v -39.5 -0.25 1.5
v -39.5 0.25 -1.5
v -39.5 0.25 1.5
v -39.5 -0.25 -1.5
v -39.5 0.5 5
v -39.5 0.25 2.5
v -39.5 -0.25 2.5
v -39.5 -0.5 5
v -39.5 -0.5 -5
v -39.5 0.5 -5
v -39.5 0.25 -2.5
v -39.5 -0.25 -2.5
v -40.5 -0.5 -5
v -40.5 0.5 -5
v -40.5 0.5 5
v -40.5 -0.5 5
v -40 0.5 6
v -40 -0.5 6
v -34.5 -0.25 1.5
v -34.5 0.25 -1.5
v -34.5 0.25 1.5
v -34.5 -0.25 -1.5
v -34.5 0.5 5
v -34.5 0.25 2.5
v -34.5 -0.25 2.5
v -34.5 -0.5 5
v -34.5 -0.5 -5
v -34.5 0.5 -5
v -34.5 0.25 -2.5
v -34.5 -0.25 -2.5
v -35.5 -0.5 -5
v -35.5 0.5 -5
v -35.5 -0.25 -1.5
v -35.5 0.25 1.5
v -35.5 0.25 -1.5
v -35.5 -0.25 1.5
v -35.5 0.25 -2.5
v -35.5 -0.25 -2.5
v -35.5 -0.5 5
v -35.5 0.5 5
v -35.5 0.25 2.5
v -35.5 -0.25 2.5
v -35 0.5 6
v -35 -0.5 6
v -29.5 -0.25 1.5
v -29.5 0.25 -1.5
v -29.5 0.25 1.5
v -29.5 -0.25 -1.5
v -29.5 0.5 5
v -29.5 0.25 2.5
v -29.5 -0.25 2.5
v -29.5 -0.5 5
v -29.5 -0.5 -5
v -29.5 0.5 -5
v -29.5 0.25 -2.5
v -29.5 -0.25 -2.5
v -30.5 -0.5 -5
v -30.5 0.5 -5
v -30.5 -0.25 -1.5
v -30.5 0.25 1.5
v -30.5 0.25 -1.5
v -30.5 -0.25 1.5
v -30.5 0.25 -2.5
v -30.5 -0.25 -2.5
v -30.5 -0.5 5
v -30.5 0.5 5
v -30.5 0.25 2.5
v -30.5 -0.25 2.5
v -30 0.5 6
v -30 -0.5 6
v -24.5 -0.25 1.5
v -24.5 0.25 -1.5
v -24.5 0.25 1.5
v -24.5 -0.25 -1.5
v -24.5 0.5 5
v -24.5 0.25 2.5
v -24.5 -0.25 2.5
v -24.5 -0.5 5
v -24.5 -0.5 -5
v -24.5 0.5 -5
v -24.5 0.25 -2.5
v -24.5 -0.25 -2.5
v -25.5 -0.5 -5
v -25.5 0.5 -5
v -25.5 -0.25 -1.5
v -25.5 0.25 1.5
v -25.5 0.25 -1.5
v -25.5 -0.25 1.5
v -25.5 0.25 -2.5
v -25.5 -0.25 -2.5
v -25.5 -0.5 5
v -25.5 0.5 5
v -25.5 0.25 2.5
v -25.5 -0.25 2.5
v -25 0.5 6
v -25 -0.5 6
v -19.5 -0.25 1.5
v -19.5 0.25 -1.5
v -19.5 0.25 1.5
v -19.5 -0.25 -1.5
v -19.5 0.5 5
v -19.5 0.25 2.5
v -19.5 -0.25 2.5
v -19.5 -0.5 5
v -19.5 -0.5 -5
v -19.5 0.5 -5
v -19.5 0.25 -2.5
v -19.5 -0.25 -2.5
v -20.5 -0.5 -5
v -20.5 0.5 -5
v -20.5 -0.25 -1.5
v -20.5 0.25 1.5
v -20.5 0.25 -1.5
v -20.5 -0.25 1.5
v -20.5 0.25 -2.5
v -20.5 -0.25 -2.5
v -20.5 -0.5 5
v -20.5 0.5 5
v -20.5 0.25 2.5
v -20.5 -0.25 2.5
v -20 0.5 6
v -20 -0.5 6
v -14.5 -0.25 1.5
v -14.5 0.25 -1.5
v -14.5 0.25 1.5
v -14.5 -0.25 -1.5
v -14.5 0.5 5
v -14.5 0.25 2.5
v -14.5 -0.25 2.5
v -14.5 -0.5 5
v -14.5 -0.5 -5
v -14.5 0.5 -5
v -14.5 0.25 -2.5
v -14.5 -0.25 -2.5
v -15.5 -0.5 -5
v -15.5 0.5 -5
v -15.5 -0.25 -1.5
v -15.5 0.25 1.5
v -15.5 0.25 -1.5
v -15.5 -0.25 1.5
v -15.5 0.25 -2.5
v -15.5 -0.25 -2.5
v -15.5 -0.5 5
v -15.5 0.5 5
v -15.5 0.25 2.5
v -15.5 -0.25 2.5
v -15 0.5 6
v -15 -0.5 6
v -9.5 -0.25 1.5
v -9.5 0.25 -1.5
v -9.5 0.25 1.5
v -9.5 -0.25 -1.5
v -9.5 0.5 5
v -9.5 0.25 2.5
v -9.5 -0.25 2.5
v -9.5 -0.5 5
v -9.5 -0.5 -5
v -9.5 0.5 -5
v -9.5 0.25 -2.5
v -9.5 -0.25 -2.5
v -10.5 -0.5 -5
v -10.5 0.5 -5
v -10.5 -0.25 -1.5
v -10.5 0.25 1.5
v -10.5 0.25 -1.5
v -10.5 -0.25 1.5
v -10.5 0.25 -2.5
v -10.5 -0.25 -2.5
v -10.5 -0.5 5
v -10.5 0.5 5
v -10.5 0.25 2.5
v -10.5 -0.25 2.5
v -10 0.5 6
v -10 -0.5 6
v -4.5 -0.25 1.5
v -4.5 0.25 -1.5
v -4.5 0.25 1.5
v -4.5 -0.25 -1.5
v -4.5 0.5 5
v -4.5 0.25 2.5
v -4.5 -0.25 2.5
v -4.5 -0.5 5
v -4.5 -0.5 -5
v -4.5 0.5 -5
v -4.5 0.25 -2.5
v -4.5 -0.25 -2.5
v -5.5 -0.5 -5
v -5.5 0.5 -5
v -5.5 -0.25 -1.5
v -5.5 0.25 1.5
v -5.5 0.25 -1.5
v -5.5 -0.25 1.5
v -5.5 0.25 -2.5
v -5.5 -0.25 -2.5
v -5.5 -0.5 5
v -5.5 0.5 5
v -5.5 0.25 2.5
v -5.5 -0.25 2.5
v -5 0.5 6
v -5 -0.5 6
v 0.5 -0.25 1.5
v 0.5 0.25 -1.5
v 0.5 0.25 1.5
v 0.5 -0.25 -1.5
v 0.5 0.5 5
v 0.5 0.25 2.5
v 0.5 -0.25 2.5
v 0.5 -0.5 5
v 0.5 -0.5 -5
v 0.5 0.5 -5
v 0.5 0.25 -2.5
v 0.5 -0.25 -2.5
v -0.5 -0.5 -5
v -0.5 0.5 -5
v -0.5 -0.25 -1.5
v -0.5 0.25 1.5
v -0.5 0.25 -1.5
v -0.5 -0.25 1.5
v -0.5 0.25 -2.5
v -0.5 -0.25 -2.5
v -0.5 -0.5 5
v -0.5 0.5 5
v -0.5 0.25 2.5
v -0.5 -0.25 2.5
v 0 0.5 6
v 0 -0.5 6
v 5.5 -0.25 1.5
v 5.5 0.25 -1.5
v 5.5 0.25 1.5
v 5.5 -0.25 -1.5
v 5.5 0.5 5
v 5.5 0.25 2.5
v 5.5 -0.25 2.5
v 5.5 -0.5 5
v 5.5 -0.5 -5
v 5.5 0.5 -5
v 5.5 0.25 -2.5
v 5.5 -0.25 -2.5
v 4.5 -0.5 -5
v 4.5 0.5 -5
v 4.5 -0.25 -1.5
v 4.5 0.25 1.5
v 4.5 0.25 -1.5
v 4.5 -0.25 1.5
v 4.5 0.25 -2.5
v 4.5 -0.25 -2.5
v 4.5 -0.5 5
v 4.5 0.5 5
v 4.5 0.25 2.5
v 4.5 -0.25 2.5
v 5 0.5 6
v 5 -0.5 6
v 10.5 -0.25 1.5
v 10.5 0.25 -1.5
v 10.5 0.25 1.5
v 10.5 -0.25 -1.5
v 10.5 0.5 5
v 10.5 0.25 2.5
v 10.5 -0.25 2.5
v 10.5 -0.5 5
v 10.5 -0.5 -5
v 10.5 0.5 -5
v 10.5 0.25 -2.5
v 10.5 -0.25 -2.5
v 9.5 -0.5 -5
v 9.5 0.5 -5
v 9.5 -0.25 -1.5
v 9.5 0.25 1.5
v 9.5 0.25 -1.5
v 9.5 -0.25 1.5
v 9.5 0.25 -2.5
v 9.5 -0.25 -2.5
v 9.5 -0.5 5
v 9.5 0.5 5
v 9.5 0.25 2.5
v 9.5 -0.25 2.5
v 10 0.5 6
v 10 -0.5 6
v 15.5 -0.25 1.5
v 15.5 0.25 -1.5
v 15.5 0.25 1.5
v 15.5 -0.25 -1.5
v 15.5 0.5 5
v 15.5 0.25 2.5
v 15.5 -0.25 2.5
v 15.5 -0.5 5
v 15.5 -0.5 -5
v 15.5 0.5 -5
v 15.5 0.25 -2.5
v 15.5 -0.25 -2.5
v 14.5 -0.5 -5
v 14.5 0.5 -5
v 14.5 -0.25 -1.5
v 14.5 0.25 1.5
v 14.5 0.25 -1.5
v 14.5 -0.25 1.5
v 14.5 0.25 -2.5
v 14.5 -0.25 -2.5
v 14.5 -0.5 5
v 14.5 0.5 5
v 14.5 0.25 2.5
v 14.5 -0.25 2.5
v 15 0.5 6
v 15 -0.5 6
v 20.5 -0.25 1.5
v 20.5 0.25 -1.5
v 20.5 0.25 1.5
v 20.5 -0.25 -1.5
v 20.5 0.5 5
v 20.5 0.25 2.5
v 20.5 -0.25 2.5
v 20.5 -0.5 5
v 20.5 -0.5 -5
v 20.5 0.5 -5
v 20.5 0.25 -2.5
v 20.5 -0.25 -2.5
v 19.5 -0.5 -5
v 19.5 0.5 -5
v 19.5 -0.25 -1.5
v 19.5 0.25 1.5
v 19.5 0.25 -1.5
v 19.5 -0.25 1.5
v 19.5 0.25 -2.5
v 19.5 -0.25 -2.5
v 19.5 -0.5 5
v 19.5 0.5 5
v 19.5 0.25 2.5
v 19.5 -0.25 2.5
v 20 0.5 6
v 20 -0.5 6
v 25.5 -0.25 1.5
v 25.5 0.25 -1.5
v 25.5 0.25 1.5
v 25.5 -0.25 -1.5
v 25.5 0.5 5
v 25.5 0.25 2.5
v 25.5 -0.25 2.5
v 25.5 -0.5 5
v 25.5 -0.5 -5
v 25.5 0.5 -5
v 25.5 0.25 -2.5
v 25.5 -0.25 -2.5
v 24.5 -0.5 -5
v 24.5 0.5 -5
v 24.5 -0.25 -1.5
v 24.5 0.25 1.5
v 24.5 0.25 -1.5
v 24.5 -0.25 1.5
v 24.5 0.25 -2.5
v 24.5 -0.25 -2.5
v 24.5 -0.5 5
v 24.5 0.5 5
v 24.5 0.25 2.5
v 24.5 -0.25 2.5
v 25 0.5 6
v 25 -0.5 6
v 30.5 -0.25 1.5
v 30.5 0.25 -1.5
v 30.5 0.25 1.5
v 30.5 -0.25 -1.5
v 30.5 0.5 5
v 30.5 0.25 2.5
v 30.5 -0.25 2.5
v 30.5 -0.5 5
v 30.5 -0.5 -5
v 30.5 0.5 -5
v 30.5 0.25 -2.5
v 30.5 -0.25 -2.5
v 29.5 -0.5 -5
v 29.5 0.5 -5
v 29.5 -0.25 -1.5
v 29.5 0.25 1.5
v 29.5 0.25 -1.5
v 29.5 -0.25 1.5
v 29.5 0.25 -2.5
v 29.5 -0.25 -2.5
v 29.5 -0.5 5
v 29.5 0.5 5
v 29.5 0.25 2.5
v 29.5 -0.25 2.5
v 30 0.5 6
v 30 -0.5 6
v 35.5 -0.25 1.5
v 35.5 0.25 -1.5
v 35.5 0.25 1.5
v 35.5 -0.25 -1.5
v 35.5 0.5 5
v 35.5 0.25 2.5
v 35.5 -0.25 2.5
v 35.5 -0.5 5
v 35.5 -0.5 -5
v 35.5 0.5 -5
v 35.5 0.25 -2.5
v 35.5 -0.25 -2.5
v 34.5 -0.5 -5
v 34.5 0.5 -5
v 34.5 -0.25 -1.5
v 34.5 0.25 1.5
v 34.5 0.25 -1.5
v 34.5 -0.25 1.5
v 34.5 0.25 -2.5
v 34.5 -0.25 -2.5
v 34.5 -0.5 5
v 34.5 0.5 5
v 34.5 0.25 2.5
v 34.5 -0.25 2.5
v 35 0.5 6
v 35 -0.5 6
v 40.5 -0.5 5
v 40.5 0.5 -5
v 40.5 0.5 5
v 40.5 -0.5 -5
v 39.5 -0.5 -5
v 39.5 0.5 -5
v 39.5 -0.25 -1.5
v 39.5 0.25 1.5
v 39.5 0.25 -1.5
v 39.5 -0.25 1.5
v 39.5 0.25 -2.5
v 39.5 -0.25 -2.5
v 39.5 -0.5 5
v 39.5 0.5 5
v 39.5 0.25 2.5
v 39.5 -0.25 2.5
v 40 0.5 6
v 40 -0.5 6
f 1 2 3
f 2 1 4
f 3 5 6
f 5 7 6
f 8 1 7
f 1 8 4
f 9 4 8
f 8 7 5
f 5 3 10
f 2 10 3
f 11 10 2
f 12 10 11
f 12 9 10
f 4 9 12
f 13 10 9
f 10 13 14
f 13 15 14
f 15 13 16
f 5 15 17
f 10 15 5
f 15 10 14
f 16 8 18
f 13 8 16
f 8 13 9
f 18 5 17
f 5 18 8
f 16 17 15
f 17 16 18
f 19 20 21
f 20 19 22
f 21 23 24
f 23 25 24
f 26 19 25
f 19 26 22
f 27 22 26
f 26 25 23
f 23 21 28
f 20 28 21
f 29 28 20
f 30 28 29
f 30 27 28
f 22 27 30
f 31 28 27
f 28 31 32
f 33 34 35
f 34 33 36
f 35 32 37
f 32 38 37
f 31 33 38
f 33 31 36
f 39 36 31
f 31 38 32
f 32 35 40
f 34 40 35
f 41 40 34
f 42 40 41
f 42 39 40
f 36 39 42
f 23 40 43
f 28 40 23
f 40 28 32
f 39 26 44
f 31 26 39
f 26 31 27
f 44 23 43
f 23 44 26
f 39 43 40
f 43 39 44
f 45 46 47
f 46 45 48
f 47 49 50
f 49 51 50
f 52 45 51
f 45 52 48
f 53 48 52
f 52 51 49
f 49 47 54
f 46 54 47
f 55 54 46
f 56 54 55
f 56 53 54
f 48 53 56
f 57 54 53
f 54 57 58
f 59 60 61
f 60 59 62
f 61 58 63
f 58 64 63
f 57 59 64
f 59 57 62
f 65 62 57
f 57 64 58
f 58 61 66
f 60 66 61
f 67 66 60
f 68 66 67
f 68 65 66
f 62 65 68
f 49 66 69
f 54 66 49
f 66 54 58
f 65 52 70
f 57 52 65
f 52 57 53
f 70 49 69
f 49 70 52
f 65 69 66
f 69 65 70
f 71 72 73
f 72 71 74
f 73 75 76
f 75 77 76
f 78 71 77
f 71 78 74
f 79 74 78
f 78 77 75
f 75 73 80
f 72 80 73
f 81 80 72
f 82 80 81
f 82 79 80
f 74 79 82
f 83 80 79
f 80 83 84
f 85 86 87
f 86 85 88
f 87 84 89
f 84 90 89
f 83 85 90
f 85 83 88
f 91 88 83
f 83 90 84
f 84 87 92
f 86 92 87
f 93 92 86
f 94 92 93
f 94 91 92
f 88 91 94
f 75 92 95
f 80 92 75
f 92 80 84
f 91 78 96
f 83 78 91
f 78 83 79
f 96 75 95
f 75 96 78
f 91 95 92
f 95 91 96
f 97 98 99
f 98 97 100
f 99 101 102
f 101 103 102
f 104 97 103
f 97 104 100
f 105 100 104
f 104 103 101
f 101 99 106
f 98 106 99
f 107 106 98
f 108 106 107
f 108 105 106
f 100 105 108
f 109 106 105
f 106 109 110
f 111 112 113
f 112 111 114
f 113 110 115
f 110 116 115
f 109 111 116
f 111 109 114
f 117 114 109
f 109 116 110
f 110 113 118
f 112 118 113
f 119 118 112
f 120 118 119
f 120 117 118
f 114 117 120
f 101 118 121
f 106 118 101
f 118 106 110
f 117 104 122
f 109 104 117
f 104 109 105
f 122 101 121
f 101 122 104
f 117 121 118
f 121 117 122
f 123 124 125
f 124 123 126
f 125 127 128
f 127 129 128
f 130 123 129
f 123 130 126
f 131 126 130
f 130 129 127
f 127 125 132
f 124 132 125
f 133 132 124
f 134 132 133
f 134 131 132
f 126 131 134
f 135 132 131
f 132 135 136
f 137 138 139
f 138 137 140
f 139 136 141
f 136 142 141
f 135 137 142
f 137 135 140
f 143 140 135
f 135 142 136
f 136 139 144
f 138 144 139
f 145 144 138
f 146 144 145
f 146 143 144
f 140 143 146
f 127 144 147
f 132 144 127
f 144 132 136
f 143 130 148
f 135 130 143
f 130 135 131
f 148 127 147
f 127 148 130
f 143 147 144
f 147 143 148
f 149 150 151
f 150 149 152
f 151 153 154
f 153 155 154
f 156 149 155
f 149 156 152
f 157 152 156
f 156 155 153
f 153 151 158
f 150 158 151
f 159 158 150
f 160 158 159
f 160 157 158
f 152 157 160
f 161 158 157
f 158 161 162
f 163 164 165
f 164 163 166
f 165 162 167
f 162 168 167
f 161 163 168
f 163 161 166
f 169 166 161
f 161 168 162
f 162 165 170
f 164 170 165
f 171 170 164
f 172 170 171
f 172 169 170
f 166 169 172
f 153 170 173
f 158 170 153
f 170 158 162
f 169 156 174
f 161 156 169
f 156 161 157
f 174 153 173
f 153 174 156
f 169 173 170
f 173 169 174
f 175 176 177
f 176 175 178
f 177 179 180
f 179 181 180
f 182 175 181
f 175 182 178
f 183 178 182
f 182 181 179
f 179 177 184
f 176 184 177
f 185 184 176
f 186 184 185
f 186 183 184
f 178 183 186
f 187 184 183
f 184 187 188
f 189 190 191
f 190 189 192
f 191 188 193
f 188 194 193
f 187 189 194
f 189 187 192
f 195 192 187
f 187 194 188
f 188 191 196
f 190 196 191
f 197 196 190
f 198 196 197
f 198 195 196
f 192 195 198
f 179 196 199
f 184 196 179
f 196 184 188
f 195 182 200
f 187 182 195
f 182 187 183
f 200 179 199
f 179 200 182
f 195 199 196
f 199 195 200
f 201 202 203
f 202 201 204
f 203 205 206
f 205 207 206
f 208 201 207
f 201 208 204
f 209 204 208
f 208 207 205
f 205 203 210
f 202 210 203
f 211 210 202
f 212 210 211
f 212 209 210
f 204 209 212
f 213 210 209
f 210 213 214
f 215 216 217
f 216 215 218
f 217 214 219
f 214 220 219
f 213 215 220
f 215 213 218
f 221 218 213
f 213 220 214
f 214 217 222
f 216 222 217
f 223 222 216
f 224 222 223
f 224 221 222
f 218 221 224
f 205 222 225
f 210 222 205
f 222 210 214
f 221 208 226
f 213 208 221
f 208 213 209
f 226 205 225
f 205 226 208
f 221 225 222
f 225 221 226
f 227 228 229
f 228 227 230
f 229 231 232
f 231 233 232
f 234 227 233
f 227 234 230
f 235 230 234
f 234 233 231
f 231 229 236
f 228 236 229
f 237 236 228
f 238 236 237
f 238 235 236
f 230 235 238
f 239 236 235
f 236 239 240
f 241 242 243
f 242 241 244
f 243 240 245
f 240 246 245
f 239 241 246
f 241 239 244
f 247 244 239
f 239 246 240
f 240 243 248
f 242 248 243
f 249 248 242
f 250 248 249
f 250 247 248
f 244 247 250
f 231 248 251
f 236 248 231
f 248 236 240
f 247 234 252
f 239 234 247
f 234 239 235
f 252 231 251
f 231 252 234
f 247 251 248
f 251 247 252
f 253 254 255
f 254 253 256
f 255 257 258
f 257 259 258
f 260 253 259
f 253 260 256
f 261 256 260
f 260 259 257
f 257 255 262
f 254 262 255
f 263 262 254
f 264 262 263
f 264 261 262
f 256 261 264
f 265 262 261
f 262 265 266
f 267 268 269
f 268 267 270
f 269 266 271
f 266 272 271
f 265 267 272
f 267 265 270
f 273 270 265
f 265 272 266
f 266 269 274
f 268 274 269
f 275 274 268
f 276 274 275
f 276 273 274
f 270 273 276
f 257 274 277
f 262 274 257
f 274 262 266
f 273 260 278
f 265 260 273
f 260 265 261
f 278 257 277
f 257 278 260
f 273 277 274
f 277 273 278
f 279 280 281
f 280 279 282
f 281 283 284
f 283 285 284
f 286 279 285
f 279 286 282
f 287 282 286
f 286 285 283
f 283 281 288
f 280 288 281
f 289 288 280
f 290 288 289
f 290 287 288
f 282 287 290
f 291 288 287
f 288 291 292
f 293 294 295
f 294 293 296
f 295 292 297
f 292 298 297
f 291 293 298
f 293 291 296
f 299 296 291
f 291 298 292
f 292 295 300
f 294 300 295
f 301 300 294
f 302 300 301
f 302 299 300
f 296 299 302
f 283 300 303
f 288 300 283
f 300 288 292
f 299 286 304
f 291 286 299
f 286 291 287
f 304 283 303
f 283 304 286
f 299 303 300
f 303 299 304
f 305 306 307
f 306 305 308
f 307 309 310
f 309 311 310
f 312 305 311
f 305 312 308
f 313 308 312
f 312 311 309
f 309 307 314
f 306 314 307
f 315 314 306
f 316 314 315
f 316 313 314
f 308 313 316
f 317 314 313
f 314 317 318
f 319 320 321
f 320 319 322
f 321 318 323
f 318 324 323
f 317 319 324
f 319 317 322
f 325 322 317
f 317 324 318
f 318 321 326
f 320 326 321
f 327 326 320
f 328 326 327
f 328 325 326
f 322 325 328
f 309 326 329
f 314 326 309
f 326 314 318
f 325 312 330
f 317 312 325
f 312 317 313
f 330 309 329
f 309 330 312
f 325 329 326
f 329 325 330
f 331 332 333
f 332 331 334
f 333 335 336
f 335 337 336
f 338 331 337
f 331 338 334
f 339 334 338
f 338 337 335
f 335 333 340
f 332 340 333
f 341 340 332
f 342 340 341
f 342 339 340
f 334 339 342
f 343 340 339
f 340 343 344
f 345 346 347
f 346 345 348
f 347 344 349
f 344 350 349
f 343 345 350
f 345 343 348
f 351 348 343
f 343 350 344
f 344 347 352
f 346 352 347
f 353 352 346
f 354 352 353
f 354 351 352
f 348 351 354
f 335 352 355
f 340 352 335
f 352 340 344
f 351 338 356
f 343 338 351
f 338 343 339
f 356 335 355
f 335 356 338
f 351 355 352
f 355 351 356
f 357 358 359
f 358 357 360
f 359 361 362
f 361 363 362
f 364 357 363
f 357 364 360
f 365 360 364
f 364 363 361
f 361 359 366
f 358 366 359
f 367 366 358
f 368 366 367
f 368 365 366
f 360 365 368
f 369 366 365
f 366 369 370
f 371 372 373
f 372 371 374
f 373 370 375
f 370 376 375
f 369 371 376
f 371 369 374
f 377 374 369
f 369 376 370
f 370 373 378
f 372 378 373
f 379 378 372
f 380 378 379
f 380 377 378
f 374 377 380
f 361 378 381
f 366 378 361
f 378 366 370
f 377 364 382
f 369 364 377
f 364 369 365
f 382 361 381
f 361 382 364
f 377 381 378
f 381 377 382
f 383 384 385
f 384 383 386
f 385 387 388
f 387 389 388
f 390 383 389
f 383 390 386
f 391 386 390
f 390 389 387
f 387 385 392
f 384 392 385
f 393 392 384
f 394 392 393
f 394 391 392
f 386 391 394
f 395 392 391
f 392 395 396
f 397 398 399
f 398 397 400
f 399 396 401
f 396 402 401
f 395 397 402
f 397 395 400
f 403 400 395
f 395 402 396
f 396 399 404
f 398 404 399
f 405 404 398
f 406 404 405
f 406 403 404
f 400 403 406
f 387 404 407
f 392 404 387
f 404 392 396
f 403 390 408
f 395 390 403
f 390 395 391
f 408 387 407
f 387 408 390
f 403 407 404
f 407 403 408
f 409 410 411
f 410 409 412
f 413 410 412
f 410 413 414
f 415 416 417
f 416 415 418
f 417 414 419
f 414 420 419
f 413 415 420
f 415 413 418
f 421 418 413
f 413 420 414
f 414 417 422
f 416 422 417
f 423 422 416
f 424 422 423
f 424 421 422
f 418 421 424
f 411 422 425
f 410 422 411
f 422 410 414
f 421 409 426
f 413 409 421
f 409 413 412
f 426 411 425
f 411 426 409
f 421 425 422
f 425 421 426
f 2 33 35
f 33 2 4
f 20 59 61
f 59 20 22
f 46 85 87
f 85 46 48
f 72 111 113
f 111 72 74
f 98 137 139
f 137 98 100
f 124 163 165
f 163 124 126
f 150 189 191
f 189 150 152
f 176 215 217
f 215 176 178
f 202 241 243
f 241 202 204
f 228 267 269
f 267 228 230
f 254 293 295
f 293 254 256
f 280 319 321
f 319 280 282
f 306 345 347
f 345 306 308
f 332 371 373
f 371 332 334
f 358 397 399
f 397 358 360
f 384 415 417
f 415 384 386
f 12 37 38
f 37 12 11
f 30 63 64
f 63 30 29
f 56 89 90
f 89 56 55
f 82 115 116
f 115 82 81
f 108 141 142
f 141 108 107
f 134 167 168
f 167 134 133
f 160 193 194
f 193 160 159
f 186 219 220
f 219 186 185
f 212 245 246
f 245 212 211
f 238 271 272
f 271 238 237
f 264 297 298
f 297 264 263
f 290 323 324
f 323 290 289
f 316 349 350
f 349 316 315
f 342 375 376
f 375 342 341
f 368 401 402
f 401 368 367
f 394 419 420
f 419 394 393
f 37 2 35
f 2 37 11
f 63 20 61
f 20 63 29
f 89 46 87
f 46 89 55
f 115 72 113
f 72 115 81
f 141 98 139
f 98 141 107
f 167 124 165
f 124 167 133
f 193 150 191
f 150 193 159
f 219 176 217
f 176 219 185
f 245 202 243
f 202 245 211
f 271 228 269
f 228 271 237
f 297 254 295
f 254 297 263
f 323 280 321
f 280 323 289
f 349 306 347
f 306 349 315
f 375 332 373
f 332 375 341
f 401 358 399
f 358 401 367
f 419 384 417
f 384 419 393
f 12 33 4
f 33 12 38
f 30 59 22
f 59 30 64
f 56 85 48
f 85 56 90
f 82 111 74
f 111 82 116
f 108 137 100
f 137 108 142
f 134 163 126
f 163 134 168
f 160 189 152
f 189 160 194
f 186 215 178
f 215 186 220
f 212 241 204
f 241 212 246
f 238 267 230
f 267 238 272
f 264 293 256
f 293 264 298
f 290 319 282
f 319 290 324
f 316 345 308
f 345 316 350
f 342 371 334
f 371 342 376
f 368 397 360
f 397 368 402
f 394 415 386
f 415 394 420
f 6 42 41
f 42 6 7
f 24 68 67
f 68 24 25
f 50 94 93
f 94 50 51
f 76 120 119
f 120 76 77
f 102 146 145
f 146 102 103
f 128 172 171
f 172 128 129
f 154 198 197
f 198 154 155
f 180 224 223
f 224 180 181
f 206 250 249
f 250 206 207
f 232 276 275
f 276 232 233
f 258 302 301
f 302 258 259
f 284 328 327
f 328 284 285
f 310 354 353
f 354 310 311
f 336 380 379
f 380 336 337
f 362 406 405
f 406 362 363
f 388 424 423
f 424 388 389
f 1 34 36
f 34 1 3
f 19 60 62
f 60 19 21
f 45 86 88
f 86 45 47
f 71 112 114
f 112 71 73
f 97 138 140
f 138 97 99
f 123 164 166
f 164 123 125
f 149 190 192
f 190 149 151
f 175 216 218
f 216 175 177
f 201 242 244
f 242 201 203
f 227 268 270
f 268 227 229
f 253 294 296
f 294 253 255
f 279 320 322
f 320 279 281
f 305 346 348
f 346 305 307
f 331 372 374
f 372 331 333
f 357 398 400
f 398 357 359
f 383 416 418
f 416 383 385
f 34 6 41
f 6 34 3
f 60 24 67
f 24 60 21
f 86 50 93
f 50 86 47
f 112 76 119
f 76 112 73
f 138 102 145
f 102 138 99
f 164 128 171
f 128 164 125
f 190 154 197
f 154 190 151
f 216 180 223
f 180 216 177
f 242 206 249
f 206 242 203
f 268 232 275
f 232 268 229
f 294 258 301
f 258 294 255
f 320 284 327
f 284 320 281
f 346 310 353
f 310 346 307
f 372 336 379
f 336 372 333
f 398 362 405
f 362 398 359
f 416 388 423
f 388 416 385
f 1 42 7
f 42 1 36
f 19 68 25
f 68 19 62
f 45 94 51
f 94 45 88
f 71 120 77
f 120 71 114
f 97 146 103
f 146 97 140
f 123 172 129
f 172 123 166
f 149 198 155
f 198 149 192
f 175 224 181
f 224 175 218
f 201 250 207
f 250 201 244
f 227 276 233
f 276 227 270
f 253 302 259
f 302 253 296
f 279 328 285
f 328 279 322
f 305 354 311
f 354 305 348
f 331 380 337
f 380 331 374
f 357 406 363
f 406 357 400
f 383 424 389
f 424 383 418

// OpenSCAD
module Fence_01(){
    
    module staccionata(){

    cube([1,1,10],center = true);  
    
    translate([0.5,0.5,5])
    rotate([90,-90,0])
    linear_extrude(height=1){
    polygon([[0,0],[0,1],[1,0.5]], paths=[[0,1,2]]);
    }

    }

    color("#e6e0d4"){
        for (i=[-8:8])
           translate([i*5,0,0])
              staccionata();
            
        translate([0,0,-2])      
        cube([80,0.5,1],center = true);

        translate([0,0,2])
        cube([80,0.5,1],center = true);
    }

}

Fence_01();

// Written by Nicolì Angelo (Gengio) 2024: 
// MIT License

//Permission is hereby granted, free of charge, to any person obtaining a copy of this software and associated documentation files (the "Software"), to deal in the Software without restriction, including without limitation the rights to use, copy, modify, merge, publish, distribute, sublicense, and/or sell copies of the Software, and to permit persons to whom the Software is furnished to do so, subject to the following conditions:

//The above copyright notice and this permission notice shall be included in all copies or substantial portions of the Software.

//THE SOFTWARE IS PROVIDED "AS IS", WITHOUT WARRANTY OF ANY KIND, EXPRESS OR IMPLIED, INCLUDING BUT NOT LIMITED TO THE WARRANTIES OF MERCHANTABILITY, FITNESS FOR A PARTICULAR PURPOSE AND NONINFRINGEMENT. IN NO EVENT SHALL THE AUTHORS OR COPYRIGHT HOLDERS BE LIABLE FOR ANY CLAIM, DAMAGES OR OTHER LIABILITY, WHETHER IN AN ACTION OF CONTRACT, TORT OR OTHERWISE, ARISING FROM, OUT OF OR IN CONNECTION WITH THE SOFTWARE OR THE USE OR OTHER DEALINGS IN THE SOFTWARE.
